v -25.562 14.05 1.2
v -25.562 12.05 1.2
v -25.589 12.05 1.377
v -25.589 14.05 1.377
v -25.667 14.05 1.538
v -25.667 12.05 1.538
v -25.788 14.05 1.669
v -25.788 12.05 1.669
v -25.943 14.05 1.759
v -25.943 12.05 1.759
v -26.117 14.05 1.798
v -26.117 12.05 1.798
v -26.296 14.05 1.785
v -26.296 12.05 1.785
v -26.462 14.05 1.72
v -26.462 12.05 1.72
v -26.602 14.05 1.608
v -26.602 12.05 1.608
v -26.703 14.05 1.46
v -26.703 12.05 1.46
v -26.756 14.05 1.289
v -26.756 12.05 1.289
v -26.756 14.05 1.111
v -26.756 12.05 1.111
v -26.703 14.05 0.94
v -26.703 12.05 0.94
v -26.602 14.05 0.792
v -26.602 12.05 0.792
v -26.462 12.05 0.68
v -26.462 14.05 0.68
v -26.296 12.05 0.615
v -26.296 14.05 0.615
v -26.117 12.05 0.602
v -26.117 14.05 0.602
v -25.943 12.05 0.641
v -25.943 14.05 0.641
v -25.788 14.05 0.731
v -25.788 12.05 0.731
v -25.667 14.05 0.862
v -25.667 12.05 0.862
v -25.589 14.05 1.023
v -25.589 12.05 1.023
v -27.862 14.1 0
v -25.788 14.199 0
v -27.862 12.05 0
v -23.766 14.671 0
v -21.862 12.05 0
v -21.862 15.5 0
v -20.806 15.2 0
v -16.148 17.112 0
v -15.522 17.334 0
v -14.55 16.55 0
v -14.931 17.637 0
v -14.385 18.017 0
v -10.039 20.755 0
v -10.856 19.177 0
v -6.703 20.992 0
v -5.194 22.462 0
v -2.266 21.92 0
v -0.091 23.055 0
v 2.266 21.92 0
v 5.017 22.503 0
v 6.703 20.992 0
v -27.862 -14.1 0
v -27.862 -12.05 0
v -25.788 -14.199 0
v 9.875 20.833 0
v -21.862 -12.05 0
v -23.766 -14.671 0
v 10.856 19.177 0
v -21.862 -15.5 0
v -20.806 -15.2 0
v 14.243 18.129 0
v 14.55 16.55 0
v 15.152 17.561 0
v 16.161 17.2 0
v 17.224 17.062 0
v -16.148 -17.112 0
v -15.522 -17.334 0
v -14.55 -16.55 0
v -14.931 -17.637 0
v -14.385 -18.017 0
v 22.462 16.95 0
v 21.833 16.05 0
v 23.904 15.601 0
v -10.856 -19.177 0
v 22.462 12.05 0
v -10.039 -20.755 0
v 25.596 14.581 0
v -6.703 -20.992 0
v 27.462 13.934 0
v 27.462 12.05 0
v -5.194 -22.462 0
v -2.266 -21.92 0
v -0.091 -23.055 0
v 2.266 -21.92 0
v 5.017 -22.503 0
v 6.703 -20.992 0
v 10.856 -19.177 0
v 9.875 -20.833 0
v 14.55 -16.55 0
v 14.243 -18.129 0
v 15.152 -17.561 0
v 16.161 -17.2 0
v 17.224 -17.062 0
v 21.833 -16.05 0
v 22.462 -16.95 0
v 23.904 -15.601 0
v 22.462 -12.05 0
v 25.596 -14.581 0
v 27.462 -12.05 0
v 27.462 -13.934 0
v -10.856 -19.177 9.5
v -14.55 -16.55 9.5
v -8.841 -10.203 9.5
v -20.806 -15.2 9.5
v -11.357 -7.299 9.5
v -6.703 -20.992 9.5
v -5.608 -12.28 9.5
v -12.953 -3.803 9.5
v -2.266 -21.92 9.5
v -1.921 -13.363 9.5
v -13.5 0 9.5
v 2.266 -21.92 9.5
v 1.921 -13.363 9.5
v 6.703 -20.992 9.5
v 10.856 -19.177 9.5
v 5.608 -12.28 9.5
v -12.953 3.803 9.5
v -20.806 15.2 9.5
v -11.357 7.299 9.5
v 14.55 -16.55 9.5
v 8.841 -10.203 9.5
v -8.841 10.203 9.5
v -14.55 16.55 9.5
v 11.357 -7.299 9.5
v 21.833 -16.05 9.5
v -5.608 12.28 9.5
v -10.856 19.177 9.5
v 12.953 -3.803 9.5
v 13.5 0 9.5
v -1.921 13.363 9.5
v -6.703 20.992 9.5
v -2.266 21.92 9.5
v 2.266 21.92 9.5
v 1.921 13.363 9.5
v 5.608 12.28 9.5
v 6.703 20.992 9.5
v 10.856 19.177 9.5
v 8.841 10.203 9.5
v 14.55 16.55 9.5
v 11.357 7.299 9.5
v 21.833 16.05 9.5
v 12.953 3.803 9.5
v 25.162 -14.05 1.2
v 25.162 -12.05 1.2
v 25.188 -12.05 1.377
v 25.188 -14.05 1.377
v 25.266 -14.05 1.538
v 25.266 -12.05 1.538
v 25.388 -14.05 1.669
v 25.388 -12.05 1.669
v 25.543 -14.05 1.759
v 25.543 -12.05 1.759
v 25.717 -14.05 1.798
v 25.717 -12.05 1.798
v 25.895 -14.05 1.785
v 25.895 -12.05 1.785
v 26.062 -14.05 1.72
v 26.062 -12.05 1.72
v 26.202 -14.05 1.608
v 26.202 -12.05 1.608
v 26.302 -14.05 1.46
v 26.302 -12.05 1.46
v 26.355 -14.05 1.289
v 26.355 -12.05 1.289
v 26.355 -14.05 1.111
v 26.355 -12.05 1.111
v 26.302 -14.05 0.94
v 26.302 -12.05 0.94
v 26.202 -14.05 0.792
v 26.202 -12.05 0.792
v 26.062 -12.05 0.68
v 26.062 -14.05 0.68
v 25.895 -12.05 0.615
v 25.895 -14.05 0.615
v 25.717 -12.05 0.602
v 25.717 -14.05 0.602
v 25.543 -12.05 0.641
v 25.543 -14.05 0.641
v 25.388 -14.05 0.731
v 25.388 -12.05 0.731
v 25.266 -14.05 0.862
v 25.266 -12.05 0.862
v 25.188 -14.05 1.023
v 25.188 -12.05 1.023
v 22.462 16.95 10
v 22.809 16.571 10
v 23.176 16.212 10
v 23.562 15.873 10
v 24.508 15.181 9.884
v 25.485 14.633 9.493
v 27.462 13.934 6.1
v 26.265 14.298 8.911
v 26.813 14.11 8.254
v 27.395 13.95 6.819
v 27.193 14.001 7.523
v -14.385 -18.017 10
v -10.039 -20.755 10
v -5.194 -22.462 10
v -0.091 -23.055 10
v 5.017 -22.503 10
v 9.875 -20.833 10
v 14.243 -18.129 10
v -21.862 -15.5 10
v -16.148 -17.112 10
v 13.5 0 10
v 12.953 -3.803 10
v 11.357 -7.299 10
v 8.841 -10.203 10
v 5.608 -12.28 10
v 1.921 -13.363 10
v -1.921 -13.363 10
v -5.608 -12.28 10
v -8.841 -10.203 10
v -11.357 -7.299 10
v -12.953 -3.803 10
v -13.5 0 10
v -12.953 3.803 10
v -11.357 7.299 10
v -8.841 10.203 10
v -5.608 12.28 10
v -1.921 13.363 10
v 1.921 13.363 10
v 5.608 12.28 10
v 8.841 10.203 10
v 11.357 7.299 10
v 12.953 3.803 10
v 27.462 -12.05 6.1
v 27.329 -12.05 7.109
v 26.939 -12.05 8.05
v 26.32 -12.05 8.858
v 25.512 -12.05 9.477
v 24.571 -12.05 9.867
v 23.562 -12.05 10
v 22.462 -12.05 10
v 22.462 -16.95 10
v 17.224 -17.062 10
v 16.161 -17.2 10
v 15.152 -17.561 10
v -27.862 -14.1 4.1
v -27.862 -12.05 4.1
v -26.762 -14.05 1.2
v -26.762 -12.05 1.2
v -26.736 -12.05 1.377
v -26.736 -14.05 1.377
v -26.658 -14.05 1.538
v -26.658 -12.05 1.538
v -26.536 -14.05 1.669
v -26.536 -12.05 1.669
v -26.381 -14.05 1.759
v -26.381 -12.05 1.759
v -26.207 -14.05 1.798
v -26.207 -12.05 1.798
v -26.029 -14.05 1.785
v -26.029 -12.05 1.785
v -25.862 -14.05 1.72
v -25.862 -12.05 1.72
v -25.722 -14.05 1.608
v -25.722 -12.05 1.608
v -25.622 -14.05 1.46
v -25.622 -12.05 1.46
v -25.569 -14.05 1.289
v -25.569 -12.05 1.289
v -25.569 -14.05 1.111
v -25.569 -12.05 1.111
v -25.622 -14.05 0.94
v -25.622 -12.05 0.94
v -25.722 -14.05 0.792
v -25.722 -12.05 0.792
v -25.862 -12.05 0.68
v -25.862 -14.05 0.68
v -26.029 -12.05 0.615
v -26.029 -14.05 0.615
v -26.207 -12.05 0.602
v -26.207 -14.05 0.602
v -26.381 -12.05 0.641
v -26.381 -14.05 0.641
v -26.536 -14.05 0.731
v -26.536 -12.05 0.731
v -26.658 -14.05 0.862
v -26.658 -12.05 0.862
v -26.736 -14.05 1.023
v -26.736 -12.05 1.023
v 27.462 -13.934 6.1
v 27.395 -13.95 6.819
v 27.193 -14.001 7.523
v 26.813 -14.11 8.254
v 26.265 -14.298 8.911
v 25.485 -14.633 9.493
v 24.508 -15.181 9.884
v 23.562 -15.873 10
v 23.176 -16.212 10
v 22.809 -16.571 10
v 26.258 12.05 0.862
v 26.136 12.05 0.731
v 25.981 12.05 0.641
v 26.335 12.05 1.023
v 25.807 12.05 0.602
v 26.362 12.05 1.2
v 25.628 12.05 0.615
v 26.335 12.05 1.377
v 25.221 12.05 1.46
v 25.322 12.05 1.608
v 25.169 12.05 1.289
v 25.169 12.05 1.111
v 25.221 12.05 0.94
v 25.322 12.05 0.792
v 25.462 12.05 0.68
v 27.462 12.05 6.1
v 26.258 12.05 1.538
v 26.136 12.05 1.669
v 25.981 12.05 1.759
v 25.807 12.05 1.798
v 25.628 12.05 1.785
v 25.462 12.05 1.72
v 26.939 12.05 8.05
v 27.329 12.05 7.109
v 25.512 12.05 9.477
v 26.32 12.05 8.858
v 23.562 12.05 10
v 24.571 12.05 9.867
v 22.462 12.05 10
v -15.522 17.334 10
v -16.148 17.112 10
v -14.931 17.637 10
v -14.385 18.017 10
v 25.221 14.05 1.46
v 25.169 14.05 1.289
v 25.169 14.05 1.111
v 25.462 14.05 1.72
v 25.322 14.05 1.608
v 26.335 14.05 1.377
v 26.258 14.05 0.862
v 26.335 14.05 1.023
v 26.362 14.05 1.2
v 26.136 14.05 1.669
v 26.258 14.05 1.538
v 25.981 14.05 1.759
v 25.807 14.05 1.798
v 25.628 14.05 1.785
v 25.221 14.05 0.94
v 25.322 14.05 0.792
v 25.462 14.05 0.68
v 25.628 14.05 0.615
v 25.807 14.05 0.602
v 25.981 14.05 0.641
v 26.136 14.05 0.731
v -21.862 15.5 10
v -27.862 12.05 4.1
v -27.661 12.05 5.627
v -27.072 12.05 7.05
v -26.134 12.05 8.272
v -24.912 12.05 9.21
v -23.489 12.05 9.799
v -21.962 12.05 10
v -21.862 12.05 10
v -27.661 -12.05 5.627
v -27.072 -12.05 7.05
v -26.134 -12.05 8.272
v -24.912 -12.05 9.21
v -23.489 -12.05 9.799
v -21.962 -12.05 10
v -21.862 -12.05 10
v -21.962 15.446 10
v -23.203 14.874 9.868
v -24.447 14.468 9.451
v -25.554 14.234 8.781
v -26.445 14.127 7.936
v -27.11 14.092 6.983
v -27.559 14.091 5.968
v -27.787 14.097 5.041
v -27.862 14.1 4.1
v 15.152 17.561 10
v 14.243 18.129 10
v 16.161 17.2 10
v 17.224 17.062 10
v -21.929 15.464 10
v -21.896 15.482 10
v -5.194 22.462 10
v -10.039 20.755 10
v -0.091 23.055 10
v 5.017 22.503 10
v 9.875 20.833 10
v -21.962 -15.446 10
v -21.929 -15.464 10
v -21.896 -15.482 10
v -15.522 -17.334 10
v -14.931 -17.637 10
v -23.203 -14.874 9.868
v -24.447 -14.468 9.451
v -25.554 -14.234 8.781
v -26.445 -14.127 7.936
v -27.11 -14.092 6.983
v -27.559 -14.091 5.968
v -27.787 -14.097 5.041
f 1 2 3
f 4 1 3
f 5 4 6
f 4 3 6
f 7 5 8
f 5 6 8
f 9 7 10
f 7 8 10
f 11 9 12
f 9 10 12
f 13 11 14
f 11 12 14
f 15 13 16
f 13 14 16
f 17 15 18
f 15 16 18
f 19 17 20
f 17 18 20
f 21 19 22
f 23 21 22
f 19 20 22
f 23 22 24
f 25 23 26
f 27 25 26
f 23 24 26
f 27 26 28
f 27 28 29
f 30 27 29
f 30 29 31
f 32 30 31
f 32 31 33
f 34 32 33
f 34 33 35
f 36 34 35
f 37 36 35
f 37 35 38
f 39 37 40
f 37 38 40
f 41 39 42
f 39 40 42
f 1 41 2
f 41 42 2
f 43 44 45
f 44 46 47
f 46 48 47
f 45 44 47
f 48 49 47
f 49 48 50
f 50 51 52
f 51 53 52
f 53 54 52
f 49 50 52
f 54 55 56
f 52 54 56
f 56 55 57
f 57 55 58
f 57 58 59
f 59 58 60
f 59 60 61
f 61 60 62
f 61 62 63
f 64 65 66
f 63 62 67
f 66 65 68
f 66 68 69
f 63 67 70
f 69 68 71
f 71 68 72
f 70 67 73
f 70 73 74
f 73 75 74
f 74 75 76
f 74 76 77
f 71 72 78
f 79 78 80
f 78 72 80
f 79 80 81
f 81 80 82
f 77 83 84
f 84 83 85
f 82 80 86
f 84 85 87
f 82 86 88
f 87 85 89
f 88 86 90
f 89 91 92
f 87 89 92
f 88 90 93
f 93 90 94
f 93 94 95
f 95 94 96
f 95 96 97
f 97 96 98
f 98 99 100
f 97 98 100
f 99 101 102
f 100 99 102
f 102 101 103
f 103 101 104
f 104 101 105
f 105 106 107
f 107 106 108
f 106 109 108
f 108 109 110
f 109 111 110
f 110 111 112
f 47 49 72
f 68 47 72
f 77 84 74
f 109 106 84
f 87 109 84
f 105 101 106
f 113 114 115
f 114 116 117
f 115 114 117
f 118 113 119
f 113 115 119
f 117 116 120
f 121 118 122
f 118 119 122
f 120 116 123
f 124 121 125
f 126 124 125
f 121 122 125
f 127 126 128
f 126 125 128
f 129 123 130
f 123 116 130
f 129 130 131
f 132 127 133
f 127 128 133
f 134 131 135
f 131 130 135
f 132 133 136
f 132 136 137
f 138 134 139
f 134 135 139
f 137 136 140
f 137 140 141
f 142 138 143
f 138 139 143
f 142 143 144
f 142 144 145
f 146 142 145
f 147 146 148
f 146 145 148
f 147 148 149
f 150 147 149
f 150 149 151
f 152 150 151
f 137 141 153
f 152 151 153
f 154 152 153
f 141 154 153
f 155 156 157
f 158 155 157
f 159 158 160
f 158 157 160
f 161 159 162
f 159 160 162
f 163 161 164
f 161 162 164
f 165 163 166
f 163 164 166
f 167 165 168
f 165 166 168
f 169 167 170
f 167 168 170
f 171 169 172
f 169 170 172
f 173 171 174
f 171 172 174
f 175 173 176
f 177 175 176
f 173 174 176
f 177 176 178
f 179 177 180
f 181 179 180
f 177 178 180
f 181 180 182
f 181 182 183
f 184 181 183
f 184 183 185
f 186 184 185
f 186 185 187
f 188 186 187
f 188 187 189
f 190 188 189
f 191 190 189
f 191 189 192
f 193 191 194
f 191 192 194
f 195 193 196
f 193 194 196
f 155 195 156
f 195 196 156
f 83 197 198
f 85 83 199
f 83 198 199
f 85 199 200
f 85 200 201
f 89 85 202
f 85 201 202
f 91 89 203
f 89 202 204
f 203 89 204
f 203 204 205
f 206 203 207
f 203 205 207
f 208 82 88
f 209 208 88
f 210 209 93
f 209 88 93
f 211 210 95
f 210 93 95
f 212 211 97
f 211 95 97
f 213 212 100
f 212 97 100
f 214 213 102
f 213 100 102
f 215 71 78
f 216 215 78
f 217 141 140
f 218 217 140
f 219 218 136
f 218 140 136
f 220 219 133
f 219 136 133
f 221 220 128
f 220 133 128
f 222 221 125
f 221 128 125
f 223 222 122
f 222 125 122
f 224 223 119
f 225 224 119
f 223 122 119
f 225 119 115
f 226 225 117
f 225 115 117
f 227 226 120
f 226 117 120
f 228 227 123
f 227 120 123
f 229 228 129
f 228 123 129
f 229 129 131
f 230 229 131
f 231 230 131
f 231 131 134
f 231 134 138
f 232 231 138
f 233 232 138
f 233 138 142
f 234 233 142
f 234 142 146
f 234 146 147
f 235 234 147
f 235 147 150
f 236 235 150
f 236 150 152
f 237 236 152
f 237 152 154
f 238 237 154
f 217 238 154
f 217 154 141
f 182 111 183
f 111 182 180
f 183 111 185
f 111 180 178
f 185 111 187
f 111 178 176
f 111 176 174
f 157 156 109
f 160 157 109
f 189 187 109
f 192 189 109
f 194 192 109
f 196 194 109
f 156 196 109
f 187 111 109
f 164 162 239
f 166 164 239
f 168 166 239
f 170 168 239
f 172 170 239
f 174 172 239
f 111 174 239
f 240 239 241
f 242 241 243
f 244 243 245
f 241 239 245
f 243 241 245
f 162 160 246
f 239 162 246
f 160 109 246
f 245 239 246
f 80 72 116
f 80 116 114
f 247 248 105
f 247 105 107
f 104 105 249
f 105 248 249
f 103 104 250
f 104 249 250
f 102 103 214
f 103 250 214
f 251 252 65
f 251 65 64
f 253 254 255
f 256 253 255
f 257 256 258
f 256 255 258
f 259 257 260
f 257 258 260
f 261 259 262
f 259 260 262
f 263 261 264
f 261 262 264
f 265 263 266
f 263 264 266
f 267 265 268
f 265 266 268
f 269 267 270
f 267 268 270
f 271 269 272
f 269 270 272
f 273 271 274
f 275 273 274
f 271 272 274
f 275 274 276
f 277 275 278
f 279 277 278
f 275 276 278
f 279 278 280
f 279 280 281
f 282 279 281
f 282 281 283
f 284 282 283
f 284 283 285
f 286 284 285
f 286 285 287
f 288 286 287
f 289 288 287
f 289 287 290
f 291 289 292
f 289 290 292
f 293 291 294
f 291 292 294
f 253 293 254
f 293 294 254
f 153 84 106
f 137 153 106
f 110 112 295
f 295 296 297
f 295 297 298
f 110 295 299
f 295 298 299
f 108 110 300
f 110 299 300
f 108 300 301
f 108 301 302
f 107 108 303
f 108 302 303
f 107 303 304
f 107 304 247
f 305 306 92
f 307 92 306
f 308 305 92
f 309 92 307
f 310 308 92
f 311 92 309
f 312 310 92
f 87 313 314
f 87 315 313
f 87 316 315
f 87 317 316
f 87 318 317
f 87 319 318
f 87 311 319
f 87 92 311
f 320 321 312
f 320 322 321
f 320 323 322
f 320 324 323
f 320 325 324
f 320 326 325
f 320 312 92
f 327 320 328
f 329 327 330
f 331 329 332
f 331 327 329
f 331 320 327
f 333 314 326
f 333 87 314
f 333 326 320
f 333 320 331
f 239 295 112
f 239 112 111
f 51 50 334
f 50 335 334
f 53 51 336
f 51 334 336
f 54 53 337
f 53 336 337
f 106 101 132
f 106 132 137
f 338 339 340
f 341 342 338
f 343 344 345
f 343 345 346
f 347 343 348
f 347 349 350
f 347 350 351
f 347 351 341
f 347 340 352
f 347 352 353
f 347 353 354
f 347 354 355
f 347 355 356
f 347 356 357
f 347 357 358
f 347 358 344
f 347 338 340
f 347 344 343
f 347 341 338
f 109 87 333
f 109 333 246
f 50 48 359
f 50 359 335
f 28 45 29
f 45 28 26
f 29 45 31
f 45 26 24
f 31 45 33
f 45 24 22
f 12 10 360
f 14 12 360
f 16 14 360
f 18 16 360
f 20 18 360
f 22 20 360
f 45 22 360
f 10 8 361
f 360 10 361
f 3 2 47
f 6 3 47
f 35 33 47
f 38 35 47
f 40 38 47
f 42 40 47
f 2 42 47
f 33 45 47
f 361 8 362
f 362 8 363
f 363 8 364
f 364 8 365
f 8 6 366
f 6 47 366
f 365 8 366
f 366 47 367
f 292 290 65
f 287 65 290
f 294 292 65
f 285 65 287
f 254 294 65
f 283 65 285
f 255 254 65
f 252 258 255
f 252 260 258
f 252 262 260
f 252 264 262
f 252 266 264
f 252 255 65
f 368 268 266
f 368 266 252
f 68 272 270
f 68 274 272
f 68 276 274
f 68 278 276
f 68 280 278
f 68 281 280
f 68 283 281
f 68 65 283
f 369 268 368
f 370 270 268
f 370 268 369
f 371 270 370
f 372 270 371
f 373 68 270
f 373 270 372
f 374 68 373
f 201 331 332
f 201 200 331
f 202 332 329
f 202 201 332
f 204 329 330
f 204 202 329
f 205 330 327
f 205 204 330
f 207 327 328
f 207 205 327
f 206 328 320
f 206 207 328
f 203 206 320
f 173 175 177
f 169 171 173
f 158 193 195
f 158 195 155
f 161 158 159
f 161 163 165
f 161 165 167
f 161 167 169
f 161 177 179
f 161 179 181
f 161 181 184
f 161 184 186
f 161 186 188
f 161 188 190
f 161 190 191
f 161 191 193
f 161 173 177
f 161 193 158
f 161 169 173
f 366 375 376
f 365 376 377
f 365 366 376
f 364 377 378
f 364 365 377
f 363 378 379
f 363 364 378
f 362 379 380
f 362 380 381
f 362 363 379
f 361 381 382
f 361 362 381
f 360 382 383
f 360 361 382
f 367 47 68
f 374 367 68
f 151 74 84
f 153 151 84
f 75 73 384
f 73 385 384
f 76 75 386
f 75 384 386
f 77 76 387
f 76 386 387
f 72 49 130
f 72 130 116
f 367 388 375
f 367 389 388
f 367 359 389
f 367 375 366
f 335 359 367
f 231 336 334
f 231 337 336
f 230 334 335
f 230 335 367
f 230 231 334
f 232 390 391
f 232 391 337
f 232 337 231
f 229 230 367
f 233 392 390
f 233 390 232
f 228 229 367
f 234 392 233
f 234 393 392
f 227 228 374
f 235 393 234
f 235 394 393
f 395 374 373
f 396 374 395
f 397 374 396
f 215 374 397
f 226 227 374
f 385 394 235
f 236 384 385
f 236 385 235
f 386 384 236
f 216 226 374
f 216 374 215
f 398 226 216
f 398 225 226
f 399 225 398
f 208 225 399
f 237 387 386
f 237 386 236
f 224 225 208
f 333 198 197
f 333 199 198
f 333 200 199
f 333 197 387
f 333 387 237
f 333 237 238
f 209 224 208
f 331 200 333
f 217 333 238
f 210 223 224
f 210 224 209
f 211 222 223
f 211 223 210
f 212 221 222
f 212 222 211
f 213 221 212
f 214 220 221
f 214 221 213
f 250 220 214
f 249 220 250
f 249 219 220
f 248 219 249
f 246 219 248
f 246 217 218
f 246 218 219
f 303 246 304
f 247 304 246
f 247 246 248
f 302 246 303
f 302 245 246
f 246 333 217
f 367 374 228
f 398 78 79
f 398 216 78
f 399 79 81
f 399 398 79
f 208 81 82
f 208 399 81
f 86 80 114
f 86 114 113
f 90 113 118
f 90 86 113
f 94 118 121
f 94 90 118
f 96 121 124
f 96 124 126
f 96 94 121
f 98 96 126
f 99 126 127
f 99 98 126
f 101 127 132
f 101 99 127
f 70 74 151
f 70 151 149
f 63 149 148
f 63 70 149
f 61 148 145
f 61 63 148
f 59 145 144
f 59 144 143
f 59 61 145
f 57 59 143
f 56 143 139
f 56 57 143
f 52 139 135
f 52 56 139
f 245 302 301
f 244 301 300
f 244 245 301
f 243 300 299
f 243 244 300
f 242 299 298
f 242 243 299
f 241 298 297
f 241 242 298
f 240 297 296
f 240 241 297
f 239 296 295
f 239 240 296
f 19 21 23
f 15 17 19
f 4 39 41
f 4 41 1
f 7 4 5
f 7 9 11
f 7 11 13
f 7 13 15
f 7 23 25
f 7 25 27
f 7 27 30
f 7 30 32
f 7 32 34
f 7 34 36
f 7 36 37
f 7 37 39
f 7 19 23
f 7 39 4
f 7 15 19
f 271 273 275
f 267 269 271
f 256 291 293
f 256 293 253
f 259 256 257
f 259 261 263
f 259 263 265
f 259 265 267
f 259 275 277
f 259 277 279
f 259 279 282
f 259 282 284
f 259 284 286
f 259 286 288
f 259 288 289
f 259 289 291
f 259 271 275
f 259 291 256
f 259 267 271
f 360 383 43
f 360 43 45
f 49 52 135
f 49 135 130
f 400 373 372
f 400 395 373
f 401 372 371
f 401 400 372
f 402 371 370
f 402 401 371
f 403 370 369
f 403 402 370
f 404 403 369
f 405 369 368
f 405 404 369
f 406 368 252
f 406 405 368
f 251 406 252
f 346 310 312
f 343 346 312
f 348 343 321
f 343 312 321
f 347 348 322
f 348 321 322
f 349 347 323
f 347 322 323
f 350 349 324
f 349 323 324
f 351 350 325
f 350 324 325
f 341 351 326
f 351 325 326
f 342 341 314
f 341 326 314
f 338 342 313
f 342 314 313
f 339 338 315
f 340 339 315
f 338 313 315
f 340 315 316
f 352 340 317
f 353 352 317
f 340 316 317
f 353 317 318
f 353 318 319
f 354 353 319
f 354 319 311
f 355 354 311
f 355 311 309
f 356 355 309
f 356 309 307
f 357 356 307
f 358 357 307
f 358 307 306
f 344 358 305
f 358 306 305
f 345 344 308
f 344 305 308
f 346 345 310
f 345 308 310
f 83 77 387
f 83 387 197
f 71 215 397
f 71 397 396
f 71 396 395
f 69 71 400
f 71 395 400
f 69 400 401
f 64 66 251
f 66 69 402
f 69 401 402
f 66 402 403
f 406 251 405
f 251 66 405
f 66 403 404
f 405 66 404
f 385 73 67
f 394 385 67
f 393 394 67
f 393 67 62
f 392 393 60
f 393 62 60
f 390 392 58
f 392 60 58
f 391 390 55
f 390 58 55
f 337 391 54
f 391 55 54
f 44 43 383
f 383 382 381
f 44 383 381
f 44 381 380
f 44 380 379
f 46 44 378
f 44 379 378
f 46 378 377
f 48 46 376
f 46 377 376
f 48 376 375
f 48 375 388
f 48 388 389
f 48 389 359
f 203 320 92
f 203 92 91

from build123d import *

# Parameters (mm, degrees)
PAD_DEPTH       = 10
POCKET_DEPTH    = 9.5
SKETCH002_R     = 13.5
POCKET001_DEPTH = 1
SKETCH003_W     = 4.9
SKETCH003_H     = 10
PAD001_DEPTH    = 5
POCKET002_DEPTH = 10
SKETCH008_R     = 0.6
POCKET003_DEPTH = 2
SKETCH009_R     = 0.6
POCKET004_DEPTH = 2
FILLET_R        = 3.9
FILLET001_R     = 3.9
FILLET002_R     = 5
FILLET003_R     = 5
FILLET004_R     = 5
FILLET005_R     = 5
SKETCH010_W     = 3.45
SKETCH010_H     = 10
PAD002_DEPTH    = 6
POCKET005_DEPTH = 10
SKETCH012_R     = 0.6
POCKET006_DEPTH = 2
SKETCH013_R     = 0.6
POCKET007_DEPTH = 2
FILLET006_R     = 5.9
FILLET007_R     = 5.9


with BuildPart() as part:
    # Sketch → Pad (new body)
    with BuildSketch(Plane.XY):
        with BuildLine():
            Line((-21.862293, 15.5), (-21.862293, -15.5))
            Line((-21.862293, -15.5), (-15.125083, -17.4))
            ThreePointArc((-15.125083, -17.4), (0.226102, -23.053785), (15.463446, -17.1))
            Line((15.463446, -17.1), (22.461838, -16.95))
            Line((22.461838, 16.95), (22.461838, -16.95))
            Line((15.463446, 17.1), (22.461838, 16.95))
            ThreePointArc((15.463446, 17.1), (0.226102, 23.053785), (-15.125083, 17.4))
            Line((-21.862293, 15.5), (-15.125083, 17.4))
        make_face()
    extrude(amount=PAD_DEPTH)

    # Sketch001 → Pocket (cut)
    with BuildSketch(Plane.XY):
        with BuildLine():
            Line((-14.55, 16.55), (-20.805997, 15.2))
            Line((-20.805997, 15.2), (-20.805997, -15.2))
            Line((-20.805997, -15.2), (-14.55, -16.55))
            ThreePointArc((-14.55, -16.55), (0, -22.036447), (14.55, -16.55))
            Line((14.55, -16.55), (21.832857, -16.05))
            Line((21.832857, 16.05), (21.832857, -16.05))
            Line((14.55, 16.55), (21.832857, 16.05))
            ThreePointArc((14.55, 16.55), (0, 22.036447), (-14.55, 16.55))
        make_face()
    extrude(amount=POCKET_DEPTH, mode=Mode.SUBTRACT)

    # Sketch002 (on Face19 of Pocket) → Pocket001 (cut)
    with BuildSketch(Plane(origin=(0, 0, 9.5), x_dir=(1, 0, 0), z_dir=(0, 0, -1))):
        Circle(SKETCH002_R)
    extrude(amount=-POCKET001_DEPTH, mode=Mode.SUBTRACT)

    # Sketch003 (on Face6 of Pocket001) → Pad001 (join)
    with BuildSketch(Plane.YZ.offset(22.461838)):
        with Locations((-14.5, 5)):
            Rectangle(SKETCH003_W, SKETCH003_H)
        with Locations((14.5, 5)):
            Rectangle(SKETCH003_W, SKETCH003_H)
    extrude(amount=PAD001_DEPTH)

    # Sketch006 → Pocket002 (cut)
    with BuildSketch(Plane.XY.offset(10)):
        with BuildLine():
            ThreePointArc((22.461838, 16.95), (24.723382, 15.046575), (27.461838, 13.93371))
            Line((27.461838, 16.95), (27.461838, 13.93371))
            Line((27.461838, 16.95), (22.461838, 16.95))
        make_face()
        with BuildLine():
            ThreePointArc((27.461838, -13.93371), (24.723382, -15.046575), (22.461838, -16.95))
            Line((27.461838, -16.95), (22.461838, -16.95))
            Line((27.461838, -13.93371), (27.461838, -16.95))
        make_face()
    extrude(amount=-POCKET002_DEPTH, mode=Mode.SUBTRACT)

    # Sketch008 (on Face27 of Pocket002) → Pocket003 (cut)
    with BuildSketch(Plane(origin=(0, -12.05, 0), x_dir=(-1, 0, 0), z_dir=(0, 1, 0))):
        with Locations((-25.761838, 1.2)):
            Circle(SKETCH008_R)
    extrude(amount=-POCKET003_DEPTH, mode=Mode.SUBTRACT)

    # Sketch009 (on Face26 of Pocket003) → Pocket004 (cut)
    with BuildSketch(Plane.XZ.offset(-12.05)):
        with Locations((25.761838, 1.2)):
            Circle(SKETCH009_R)
    extrude(amount=-POCKET004_DEPTH, mode=Mode.SUBTRACT)

    # Fillet
    fillet_edges = [part.edges().sort_by_distance(p)[0] for p in [
        (27.461838, -12.991855, 10),
    ]]
    fillet(fillet_edges, radius=FILLET_R)

    # Fillet001
    fillet001_edges = [part.edges().sort_by_distance(p)[0] for p in [
        (27.461838, 12.991855, 10),
    ]]
    fillet(fillet001_edges, radius=FILLET001_R)

    # Fillet002
    fillet002_edges = [part.edges().sort_by_distance(p)[0] for p in [
        (15.463446, -17.1, 5),
    ]]
    fillet(fillet002_edges, radius=FILLET002_R)

    # Fillet003
    fillet003_edges = [part.edges().sort_by_distance(p)[0] for p in [
        (15.463446, 17.1, 5),
    ]]
    fillet(fillet003_edges, radius=FILLET003_R)

    # Fillet004
    fillet004_edges = [part.edges().sort_by_distance(p)[0] for p in [
        (-15.125083, -17.4, 5),
    ]]
    fillet(fillet004_edges, radius=FILLET004_R)

    # Fillet005
    fillet005_edges = [part.edges().sort_by_distance(p)[0] for p in [
        (-15.125083, 17.4, 5),
    ]]
    fillet(fillet005_edges, radius=FILLET005_R)

    # Sketch010 (on Face4 of Fillet005) → Pad002 (join)
    with BuildSketch(Plane(origin=(-21.862293, 0, 0), x_dir=(0, -1, 0), z_dir=(-1, 0, 0))):
        with Locations((-13.775, 5)):
            Rectangle(SKETCH010_W, SKETCH010_H)
        with Locations((13.775, 5)):
            Rectangle(SKETCH010_W, SKETCH010_H)
    extrude(amount=PAD002_DEPTH)

    # Sketch011 (on Face6 of Pad002) → Pocket005 (cut)
    with BuildSketch(Plane.XY.offset(10)):
        with BuildLine():
            ThreePointArc((-27.862293, 14.1), (-24.766364, 14.388874), (-21.862293, 15.5))
            Line((-21.862293, 15.5), (-27.862293, 15.5))
            Line((-27.862293, 15.5), (-27.862293, 14.1))
        make_face()
        with BuildLine():
            ThreePointArc((-21.862293, -15.5), (-24.766364, -14.388874), (-27.862293, -14.1))
            Line((-27.862293, -14.1), (-27.862293, -15.5))
            Line((-27.862293, -15.5), (-21.862293, -15.5))
        make_face()
    extrude(amount=-POCKET005_DEPTH, mode=Mode.SUBTRACT)

    # Sketch012 (on Face23 of Pocket005) → Pocket006 (cut)
    with BuildSketch(Plane(origin=(0, -12.05, 0), x_dir=(-1, 0, 0), z_dir=(0, 1, 0))):
        with Locations((26.162293, 1.2)):
            Circle(SKETCH012_R)
    extrude(amount=-POCKET006_DEPTH, mode=Mode.SUBTRACT)

    # Sketch013 (on Face21 of Pocket006) → Pocket007 (cut)
    with BuildSketch(Plane.XZ.offset(-12.05)):
        with Locations((-26.162293, 1.2)):
            Circle(SKETCH013_R)
    extrude(amount=-POCKET007_DEPTH, mode=Mode.SUBTRACT)

    # Fillet006
    fillet006_edges = [part.edges().sort_by_distance(p)[0] for p in [
        (-27.862293, 13.075, 10),
    ]]
    fillet(fillet006_edges, radius=FILLET006_R)

    # Fillet007
    fillet007_edges = [part.edges().sort_by_distance(p)[0] for p in [
        (-27.862293, -13.075, 10),
    ]]
    fillet(fillet007_edges, radius=FILLET007_R)


solid = part.part
